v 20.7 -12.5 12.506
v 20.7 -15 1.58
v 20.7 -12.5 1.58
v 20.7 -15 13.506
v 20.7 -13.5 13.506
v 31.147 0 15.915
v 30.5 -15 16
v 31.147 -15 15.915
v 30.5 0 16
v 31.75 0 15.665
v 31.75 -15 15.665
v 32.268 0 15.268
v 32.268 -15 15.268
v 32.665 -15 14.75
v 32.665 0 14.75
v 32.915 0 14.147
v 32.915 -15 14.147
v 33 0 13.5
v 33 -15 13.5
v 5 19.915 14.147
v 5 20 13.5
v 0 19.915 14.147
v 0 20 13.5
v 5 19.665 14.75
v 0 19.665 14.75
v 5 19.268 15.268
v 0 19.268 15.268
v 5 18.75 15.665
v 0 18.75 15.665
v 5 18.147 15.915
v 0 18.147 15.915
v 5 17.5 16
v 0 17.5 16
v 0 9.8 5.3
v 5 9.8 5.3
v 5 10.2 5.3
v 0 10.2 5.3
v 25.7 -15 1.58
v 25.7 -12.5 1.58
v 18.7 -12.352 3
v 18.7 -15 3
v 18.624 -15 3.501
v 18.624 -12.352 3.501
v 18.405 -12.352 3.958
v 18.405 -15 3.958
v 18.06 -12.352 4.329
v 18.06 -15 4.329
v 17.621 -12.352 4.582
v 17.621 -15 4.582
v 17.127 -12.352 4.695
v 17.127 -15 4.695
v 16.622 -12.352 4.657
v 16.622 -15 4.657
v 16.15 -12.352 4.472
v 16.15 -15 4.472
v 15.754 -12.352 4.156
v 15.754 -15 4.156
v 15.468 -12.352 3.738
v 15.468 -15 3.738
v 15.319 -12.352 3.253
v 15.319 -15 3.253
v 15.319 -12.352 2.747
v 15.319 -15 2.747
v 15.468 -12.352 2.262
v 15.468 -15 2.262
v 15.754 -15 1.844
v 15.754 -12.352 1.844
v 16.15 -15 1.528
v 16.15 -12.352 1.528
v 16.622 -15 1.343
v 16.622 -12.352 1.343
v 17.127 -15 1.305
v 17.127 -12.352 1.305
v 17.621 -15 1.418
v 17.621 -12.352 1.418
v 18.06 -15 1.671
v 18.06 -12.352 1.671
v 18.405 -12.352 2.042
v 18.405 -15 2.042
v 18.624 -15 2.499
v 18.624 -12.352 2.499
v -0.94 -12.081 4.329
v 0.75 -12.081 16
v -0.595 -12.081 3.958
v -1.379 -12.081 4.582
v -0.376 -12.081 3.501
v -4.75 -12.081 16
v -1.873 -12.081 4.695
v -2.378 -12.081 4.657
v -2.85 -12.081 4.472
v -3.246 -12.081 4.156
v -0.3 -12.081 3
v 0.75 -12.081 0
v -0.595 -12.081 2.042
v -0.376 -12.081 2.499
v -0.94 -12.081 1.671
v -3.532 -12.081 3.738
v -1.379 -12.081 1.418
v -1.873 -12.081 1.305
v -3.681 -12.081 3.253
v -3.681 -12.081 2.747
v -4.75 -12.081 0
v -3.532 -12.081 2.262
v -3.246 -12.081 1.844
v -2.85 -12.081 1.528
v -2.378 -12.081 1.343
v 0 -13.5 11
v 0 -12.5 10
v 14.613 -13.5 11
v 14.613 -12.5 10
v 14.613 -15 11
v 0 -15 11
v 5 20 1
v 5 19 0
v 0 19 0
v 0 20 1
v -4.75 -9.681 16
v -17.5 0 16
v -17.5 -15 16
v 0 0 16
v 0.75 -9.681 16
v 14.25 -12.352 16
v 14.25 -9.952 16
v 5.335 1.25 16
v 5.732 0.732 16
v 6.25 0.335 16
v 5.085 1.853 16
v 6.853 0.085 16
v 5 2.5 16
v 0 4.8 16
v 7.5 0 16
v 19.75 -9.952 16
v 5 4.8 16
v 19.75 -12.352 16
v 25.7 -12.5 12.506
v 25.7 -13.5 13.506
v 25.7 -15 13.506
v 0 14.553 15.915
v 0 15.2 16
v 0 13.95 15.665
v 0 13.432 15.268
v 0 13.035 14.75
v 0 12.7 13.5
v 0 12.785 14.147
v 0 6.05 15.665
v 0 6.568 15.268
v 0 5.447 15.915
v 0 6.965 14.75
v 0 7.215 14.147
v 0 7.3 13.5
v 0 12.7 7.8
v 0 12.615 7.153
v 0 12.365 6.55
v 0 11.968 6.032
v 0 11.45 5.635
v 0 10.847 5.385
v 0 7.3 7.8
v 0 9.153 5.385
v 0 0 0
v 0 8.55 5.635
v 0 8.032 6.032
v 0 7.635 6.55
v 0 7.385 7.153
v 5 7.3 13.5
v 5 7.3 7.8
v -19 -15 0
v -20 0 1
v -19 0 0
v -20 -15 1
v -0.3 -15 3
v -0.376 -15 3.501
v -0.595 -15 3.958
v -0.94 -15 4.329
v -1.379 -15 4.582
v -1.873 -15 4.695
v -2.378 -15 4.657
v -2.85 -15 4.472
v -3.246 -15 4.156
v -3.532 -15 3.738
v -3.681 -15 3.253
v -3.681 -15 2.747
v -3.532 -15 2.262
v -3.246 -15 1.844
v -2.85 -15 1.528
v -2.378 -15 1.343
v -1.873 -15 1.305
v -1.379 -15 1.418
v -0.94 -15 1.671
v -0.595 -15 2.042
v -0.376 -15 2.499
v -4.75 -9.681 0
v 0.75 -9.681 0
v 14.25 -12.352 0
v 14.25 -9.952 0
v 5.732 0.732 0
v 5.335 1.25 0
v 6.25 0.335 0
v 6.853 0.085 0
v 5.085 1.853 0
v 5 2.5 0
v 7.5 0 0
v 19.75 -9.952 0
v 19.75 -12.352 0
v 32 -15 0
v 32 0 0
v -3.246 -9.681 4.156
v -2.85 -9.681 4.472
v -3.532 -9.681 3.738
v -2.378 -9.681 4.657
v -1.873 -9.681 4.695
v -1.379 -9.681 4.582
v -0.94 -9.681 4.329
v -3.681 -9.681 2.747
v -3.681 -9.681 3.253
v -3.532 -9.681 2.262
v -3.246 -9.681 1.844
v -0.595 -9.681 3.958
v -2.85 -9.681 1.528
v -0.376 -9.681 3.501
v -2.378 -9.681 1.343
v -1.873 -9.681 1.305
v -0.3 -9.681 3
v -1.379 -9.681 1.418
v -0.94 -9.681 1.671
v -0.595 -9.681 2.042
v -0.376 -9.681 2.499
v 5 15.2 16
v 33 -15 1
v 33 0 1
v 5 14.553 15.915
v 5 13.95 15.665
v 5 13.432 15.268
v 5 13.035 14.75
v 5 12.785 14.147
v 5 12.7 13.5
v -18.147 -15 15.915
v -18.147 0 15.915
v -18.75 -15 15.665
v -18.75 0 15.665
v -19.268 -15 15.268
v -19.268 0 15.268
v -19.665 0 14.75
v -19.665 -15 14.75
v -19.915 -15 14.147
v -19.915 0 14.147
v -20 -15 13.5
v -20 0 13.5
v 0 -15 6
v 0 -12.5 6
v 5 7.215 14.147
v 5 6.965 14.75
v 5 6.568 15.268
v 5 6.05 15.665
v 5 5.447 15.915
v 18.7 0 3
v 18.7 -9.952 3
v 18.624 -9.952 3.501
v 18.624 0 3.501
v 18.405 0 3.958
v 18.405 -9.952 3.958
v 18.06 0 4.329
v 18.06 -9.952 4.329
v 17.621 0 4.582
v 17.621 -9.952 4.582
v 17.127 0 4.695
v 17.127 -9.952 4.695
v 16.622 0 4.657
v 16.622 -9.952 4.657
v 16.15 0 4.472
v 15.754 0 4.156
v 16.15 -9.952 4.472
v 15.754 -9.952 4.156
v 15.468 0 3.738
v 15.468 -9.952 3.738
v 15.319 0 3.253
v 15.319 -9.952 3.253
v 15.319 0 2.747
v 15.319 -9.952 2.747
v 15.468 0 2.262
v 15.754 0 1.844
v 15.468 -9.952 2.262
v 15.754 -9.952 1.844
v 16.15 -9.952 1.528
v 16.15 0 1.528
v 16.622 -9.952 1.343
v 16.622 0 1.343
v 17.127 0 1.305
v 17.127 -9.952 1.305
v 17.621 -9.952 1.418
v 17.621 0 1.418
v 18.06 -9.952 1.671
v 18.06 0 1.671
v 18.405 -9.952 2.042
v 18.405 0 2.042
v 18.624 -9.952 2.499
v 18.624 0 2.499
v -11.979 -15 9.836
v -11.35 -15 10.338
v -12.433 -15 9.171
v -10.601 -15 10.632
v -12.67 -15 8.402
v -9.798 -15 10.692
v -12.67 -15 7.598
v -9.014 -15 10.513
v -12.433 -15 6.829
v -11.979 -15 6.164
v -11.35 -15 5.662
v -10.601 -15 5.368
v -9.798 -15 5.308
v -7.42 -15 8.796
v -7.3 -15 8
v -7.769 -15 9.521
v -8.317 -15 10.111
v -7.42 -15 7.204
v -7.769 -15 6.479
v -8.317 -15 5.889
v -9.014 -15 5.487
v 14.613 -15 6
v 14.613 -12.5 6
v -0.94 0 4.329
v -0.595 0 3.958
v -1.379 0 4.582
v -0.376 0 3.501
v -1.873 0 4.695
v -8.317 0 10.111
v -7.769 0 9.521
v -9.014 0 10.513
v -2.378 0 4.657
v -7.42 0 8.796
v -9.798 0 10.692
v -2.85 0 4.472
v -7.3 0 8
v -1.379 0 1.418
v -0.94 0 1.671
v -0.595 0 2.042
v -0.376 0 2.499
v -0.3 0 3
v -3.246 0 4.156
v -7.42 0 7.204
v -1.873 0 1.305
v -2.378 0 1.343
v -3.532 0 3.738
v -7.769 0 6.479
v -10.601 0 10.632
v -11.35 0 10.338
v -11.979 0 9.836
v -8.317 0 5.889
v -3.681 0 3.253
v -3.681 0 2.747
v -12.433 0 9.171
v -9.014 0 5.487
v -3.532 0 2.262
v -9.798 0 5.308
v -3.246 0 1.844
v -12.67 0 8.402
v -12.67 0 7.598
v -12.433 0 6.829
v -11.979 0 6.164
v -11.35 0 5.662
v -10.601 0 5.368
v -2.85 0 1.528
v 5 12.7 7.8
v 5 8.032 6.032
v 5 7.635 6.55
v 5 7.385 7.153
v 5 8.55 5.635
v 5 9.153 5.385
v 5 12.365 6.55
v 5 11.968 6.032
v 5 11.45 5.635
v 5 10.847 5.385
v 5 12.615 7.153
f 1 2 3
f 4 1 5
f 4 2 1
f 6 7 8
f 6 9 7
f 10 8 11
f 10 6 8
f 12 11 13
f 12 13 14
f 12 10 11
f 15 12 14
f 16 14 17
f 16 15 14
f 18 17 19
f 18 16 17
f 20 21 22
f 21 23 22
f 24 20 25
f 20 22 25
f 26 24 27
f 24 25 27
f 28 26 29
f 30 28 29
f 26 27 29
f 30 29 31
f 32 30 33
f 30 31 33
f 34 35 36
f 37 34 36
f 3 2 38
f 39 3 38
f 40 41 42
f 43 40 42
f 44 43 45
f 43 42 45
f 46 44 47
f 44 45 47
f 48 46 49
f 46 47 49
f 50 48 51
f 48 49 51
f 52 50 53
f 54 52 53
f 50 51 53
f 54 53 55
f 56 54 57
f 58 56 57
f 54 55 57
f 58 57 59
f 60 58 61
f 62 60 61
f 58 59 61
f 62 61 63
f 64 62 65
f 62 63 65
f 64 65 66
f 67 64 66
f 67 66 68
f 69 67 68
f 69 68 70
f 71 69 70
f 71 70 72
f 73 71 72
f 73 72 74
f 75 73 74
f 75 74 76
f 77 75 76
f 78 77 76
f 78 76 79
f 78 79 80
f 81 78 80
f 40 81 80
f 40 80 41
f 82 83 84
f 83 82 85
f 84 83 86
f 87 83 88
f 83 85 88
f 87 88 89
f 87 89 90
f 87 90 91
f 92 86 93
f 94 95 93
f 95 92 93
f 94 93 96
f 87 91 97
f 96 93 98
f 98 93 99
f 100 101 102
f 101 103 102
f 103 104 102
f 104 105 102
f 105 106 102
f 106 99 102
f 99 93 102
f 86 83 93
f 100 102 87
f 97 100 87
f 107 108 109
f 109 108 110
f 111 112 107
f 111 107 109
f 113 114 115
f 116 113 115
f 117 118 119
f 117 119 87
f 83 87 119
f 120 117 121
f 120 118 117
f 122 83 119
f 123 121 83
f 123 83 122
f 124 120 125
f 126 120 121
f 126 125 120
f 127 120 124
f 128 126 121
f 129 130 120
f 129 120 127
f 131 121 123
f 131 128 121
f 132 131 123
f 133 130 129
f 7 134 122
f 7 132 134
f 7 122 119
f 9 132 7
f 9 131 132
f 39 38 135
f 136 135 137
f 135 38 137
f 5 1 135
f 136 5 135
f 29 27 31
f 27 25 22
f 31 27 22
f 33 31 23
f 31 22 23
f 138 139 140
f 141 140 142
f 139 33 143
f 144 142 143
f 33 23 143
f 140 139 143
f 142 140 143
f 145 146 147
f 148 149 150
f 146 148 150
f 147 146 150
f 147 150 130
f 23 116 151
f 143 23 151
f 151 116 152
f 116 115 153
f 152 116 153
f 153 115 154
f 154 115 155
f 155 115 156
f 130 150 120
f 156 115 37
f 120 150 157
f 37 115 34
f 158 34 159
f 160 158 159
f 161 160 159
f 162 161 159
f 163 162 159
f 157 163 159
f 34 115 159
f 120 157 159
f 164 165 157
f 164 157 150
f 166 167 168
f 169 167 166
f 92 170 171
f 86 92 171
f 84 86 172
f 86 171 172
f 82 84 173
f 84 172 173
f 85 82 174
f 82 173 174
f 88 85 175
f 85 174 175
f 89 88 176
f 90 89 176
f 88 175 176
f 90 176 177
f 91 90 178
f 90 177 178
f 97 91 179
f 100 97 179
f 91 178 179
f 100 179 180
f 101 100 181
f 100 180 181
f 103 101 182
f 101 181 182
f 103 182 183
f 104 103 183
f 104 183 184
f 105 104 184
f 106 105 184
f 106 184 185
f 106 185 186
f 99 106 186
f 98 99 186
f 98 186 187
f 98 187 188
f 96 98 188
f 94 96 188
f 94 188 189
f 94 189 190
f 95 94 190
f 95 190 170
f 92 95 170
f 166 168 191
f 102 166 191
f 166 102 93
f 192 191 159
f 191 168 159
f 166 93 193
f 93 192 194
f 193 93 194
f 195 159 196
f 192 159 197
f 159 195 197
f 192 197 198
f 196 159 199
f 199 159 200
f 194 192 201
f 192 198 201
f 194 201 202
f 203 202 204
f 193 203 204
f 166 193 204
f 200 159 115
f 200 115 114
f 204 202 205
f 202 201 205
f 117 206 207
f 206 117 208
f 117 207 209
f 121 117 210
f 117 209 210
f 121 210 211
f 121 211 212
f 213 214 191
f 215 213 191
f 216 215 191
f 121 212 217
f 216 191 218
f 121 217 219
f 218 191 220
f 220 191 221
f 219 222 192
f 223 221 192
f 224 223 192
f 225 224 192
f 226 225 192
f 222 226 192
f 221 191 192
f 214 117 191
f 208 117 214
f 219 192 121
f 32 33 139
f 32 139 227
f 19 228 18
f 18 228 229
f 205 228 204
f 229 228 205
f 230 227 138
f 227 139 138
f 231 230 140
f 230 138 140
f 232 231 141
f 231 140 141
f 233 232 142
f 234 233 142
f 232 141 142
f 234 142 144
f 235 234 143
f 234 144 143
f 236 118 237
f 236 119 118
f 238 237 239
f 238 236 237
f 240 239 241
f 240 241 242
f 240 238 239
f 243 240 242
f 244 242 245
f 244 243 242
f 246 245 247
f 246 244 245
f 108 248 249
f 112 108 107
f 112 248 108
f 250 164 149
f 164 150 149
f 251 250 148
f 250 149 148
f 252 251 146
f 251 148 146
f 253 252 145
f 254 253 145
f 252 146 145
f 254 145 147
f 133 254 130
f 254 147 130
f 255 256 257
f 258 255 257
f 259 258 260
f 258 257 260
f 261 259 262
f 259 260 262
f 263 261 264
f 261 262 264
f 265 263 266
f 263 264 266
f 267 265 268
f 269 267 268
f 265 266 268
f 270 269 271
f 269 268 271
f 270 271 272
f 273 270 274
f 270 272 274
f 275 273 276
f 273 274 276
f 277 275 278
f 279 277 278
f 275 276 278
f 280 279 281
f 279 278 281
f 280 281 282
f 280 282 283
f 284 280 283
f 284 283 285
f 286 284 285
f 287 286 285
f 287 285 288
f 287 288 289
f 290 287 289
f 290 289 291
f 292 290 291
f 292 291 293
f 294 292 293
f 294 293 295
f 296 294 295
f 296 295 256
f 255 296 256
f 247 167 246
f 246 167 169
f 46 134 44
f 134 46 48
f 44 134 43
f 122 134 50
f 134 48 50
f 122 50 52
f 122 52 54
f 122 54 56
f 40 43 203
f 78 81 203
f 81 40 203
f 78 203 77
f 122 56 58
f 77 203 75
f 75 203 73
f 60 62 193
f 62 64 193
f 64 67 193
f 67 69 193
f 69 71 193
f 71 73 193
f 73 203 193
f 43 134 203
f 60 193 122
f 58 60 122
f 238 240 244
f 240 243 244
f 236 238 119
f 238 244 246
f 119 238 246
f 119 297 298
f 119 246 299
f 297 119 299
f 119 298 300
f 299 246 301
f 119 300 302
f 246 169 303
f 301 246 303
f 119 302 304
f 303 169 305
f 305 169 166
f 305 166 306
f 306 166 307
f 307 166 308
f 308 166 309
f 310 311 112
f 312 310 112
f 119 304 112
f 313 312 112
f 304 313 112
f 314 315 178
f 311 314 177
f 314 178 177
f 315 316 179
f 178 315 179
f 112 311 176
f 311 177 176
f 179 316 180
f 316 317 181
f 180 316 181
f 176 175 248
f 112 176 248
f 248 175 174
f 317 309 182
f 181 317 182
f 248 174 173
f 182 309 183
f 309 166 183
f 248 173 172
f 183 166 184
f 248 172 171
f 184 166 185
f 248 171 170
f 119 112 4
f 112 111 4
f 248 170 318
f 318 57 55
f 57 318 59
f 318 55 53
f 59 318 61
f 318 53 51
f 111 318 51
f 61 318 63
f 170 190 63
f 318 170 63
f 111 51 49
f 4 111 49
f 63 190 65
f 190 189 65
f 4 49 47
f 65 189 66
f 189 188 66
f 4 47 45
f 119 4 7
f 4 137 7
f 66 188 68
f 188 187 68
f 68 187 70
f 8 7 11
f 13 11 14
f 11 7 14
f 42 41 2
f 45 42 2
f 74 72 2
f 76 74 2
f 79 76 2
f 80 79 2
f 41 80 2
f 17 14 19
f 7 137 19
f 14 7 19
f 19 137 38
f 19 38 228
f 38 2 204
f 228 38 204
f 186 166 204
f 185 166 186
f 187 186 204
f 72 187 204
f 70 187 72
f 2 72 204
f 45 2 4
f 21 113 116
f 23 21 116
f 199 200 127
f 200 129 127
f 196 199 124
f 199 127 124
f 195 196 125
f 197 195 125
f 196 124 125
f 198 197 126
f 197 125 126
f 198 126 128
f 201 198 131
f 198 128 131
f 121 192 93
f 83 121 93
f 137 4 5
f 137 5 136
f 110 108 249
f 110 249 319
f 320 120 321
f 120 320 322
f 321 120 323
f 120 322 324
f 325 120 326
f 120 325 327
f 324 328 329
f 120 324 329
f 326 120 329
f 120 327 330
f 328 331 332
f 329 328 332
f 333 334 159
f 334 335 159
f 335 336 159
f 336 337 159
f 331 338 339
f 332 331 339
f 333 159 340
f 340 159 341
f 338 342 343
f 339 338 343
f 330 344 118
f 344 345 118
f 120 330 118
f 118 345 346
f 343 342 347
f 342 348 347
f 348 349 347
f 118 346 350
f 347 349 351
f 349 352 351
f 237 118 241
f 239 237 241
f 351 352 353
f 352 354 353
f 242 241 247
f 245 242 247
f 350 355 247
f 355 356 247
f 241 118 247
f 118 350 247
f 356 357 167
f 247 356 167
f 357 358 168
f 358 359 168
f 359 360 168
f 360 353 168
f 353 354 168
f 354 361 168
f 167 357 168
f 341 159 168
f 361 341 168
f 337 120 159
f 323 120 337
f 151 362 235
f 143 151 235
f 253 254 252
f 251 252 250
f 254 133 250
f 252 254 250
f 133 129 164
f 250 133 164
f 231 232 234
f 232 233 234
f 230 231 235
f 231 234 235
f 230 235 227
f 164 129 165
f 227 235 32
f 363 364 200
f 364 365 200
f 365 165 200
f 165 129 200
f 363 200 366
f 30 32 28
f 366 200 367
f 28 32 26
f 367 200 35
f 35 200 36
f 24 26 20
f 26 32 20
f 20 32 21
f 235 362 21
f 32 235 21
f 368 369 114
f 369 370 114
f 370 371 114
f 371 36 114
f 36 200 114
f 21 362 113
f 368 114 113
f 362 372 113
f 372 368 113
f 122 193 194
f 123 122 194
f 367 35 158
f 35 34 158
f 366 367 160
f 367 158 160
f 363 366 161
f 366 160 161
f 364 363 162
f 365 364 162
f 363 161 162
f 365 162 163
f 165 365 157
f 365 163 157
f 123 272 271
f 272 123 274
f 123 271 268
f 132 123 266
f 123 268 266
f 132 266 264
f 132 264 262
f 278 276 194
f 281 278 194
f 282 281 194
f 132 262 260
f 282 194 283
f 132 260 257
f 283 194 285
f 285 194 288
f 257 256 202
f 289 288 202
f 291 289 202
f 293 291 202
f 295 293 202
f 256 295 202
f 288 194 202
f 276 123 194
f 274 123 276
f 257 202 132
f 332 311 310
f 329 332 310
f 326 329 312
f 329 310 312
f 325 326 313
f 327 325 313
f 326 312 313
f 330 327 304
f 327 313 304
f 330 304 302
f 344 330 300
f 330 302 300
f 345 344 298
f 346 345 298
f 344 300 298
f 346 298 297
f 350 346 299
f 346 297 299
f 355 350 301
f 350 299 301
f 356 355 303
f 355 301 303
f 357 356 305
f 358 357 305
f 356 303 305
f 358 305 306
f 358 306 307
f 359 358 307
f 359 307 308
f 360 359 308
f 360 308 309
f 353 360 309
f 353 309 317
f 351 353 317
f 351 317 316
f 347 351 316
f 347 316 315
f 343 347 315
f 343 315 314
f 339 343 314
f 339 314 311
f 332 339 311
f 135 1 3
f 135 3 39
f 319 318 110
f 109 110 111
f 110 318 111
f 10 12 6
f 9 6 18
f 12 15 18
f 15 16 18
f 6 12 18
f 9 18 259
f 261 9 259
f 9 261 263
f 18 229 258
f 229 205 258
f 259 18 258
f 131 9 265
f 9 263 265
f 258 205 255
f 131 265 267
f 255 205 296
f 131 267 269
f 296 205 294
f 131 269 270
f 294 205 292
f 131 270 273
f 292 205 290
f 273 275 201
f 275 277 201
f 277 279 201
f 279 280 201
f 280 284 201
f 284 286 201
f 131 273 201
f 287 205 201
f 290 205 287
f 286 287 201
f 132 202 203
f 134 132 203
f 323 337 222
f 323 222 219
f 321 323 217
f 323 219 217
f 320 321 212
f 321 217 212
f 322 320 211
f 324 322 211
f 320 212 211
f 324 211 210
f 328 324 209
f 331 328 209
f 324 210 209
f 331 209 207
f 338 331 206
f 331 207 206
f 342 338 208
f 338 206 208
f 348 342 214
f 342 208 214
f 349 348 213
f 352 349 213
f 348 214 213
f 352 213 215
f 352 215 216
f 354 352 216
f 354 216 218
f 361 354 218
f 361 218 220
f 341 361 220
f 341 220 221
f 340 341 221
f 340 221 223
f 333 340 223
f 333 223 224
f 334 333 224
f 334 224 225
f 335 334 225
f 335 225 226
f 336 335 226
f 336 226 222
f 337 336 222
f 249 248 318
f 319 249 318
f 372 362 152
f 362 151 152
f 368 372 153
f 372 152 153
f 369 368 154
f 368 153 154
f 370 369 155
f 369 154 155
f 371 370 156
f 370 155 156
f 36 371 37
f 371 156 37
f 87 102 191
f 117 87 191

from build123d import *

# Parameters (mm, degrees)
F1_DEPTH  = 16
F2_R      = 1.7
F3_DEPTH  = 25
F5_DEPTH  = 25
F2_W      = 14.61311616
F2_H      = 5
F2_W_2    = 5
F2_H_2    = 11.9260823121
F6_DEPTH  = 2.5
F7_W      = 5.4
F7_H      = 10.7
F8_DEPTH  = 25
F9_R      = 2.5
F10_SIZE  = 1
F2_R_2    = 2.7
F11_DEPTH = 25


with BuildPart() as f1:
    # F0 (on Top) → F1 (new body)
    with BuildSketch(Plane.XY):
        Polygon((5, 20), (0, 20), (0, 0), (-20, 0), (-20, -15), (33, -15), (33, 0), (5, 0), align=None)
    extrude(amount=F1_DEPTH)

    # F2 (on face) → F3 (cut)
    with BuildSketch(Plane.XZ.offset(15)):
        with Locations((17, 3)):
            Circle(F2_R)
        with Locations((-2, 3)):
            Circle(F2_R)
    extrude(amount=-F3_DEPTH, mode=Mode.SUBTRACT)

    # F4 (on face) → F5 (cut)
    with BuildSketch(Plane(origin=(0, 0, 0), x_dir=(1, 0, 0), z_dir=(0, 0, -1))):
        Polygon((19.75, 12.3516352639), (17, 12.3516352639), (14.25, 12.3516352639), (14.25, 9.9516352639), (17, 9.9516352639), (19.75, 9.9516352639), align=None)
        Polygon((0.75, 12.0808439121), (-2, 12.0808439121), (-4.75, 12.0808439121), (-4.75, 9.6808439121), (-2, 9.6808439121), (0.75, 9.6808439121), align=None)
    extrude(amount=-F5_DEPTH, mode=Mode.SUBTRACT)

    # F2 (on face) → F6 (cut)
    with BuildSketch(Plane.XZ.offset(15)):
        with Locations((7.30655808, 8.5)):
            Rectangle(F2_W, F2_H)
        with Locations((23.2, 7.5428758864)):
            Rectangle(F2_W_2, F2_H_2)
    extrude(amount=-F6_DEPTH, mode=Mode.SUBTRACT)

    # F7 (on face) → F8 (cut)
    with BuildSketch(Plane.YZ.offset(5)):
        with Locations((10, 10.65)):
            Rectangle(F7_W, F7_H)
    extrude(amount=-F8_DEPTH, mode=Mode.SUBTRACT)

    # F9
    f9_edges = [f1.edges().sort_by_distance(p)[0] for p in [
        (2.5, 7.3, 5.3),
        (2.5, 12.7, 5.3),
        (2.5, 20, 16),
        (-20, -7.5, 16),
        (33, -7.5, 16),
        (2.5, 12.7, 16),
        (2.5, 7.3, 16),
        (5, 0, 8),
    ]]
    fillet(f9_edges, radius=F9_R)

    # F10
    f10_edges = [f1.edges().sort_by_distance(p)[0] for p in [
        (7.306558, -12.5, 11),
        (23.2, -12.5, 13.505917),
        (33, -7.5, 0),
        (-20, -7.5, 0),
        (2.5, 20, 0),
    ]]
    chamfer(f10_edges, length=F10_SIZE)

    # F2 (on face) → F11 (cut)
    with BuildSketch(Plane.XZ.offset(15)):
        with Locations((-10, 8)):
            Circle(F2_R_2)
    extrude(amount=-F11_DEPTH, mode=Mode.SUBTRACT)


solid = f1.part
